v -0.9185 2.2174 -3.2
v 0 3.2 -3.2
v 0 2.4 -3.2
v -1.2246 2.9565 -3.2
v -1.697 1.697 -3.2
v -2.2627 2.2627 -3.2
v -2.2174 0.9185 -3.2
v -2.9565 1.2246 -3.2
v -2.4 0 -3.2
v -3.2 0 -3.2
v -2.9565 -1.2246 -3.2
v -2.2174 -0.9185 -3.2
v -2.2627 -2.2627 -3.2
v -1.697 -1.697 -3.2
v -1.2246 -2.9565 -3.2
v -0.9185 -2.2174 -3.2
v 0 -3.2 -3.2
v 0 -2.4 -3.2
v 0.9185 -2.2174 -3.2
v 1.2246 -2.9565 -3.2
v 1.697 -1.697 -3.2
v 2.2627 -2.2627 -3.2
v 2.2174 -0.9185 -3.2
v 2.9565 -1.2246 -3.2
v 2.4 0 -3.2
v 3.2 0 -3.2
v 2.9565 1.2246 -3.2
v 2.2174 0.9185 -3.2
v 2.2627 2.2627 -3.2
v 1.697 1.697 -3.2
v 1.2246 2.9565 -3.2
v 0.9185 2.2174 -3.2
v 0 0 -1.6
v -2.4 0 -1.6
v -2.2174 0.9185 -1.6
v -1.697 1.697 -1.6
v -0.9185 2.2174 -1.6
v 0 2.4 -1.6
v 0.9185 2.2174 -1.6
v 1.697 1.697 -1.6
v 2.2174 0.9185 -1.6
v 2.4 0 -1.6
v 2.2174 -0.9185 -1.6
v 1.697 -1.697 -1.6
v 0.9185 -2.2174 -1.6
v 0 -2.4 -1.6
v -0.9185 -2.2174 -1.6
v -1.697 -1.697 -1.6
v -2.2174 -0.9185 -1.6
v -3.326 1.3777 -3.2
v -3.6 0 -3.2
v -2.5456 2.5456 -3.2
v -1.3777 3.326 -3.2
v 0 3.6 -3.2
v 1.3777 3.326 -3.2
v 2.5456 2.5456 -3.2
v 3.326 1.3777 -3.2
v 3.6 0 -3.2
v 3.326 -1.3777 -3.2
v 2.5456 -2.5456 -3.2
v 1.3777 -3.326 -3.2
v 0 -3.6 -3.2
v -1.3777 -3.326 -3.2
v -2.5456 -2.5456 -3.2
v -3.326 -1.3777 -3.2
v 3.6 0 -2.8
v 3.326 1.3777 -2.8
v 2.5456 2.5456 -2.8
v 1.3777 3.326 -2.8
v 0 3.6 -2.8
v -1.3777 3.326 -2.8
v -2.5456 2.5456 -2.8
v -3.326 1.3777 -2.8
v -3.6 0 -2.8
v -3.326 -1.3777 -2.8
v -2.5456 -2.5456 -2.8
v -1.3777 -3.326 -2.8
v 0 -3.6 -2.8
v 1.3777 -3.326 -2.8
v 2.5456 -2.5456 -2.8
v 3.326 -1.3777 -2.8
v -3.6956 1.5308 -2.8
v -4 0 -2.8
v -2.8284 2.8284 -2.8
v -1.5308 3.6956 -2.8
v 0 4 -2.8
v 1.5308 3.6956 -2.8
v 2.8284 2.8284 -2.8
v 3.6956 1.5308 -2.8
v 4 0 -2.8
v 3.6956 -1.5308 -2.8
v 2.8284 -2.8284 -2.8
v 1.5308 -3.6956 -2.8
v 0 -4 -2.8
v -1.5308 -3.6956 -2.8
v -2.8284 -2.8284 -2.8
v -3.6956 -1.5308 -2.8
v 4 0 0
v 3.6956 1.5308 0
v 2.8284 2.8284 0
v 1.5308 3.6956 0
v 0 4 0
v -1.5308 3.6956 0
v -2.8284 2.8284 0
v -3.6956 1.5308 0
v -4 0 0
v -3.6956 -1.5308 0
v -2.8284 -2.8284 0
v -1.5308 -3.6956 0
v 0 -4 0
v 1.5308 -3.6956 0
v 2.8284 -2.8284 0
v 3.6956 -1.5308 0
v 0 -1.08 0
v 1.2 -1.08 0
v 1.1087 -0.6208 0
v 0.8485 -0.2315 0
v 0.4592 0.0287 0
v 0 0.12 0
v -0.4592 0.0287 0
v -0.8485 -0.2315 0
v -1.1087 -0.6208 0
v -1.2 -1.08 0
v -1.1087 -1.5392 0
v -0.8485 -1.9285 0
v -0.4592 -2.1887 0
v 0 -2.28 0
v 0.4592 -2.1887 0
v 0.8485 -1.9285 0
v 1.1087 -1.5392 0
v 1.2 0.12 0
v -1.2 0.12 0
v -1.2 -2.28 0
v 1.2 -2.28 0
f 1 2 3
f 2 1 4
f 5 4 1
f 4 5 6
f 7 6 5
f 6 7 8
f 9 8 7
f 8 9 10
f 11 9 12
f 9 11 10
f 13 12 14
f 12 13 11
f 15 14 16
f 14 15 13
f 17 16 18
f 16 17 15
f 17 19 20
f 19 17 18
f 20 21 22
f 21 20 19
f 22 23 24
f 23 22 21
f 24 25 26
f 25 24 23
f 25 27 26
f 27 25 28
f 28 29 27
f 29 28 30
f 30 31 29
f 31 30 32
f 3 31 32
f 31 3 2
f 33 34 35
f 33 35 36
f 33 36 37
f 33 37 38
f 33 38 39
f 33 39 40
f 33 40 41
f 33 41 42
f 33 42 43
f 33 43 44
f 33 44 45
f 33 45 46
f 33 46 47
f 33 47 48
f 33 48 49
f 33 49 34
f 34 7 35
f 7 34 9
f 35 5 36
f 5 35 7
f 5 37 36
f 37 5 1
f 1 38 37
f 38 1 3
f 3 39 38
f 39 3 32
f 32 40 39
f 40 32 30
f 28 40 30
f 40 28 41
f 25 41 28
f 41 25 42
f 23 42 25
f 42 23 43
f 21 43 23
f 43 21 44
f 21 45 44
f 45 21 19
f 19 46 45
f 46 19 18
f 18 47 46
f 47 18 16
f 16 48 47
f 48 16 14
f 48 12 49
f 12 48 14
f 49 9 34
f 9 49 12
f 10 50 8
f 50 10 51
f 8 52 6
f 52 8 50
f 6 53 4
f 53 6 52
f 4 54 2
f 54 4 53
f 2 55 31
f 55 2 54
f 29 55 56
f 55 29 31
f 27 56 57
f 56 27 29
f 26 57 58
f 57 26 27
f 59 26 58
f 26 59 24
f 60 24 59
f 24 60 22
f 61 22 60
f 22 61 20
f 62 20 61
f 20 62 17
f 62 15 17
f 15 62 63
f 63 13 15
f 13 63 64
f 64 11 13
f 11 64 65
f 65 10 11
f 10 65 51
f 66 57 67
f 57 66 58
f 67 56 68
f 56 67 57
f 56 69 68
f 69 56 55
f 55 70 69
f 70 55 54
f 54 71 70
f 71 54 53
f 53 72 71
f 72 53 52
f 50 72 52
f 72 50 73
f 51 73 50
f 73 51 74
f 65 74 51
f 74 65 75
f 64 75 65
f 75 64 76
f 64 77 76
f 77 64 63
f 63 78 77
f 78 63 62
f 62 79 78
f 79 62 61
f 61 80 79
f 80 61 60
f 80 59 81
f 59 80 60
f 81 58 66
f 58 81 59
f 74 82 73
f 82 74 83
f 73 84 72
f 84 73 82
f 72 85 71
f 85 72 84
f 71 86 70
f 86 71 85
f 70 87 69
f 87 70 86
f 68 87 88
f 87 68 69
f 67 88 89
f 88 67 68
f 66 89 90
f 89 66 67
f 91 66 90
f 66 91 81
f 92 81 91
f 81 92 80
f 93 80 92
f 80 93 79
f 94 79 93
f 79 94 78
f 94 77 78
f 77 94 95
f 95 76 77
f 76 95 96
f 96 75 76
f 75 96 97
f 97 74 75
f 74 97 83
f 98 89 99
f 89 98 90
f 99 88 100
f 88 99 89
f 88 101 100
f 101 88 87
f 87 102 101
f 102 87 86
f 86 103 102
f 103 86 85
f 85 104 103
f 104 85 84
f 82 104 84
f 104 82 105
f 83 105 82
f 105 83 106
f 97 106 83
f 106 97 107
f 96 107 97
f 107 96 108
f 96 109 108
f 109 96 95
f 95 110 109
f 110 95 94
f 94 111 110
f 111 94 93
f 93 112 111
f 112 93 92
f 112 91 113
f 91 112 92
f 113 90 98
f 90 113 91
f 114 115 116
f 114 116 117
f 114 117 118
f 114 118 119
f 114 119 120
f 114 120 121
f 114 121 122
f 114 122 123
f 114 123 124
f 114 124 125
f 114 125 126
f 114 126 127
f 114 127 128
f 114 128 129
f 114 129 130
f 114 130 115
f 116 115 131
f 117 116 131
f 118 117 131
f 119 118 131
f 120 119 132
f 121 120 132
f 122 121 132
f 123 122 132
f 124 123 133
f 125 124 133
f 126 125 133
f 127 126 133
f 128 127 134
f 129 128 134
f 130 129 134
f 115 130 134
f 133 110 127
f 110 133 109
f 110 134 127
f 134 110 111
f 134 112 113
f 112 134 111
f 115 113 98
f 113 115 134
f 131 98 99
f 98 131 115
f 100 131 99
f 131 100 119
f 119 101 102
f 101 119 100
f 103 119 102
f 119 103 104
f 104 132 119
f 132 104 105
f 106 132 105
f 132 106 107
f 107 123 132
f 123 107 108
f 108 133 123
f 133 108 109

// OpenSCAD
// file: ../p/4-4ring3.scad
use <../lib.scad>
function ldraw_lib__4_4ring3() = [
// 0 Ring  3 x 1.0
// 0 Name: 4-4ring3.dat
// 0 Author: James Jessiman
// 0 !LDRAW_ORG Primitive UPDATE 2009-01
// 0 !LICENSE Licensed under CC BY 2.0 and CC BY 4.0 : see CAreadme.txt
// 
// 0 BFC CERTIFY CCW
  [0,"BFC","CERTIFY"],
  [0,"BFC","CCW"],
// 
// 0 !HISTORY 1998-12-15 [PTadmin] Official Update 1998-10
// 0 !HISTORY 2002-04-05 [hafhead] Added BFC statement
// 0 !HISTORY 2002-04-25 [PTadmin] Official Update 2002-02
// 0 !HISTORY 2007-06-24 [PTadmin] Header formatted for Contributor Agreement
// 0 !HISTORY 2008-07-01 [PTadmin] Official Update 2008-01
// 0 !HISTORY 2008-08-26 [cwdee] Switch polygon winding and rename
// 0 !HISTORY 2009-05-02 [PTadmin] Official Update 2009-01
// 
// 
// 4 16 -1.5308 0 3.6956 -1.1481 0 2.7717 0 0 3 0 0 4
  [4,16,-1.5308,0,3.6956,-1.1481,0,2.7717,0,0,3,0,0,4],
// 4 16 -2.8284 0 2.8284 -2.1213 0 2.1213 -1.1481 0 2.7717 -1.5308 0 3.6956
  [4,16,-2.8284,0,2.8284,-2.1213,0,2.1213,-1.1481,0,2.7717,-1.5308,0,3.6956],
// 4 16 -3.6956 0 1.5308 -2.7717 0 1.1481 -2.1213 0 2.1213 -2.8284 0 2.8284
  [4,16,-3.6956,0,1.5308,-2.7717,0,1.1481,-2.1213,0,2.1213,-2.8284,0,2.8284],
// 4 16 -4 0 0 -3 0 0 -2.7717 0 1.1481 -3.6956 0 1.5308
  [4,16,-4,0,0,-3,0,0,-2.7717,0,1.1481,-3.6956,0,1.5308],
// 4 16 -3.6956 0 -1.5308 -2.7717 0 -1.1481 -3 0 0 -4 0 0
  [4,16,-3.6956,0,-1.5308,-2.7717,0,-1.1481,-3,0,0,-4,0,0],
// 4 16 -2.8284 0 -2.8284 -2.1213 0 -2.1213 -2.7717 0 -1.1481 -3.6956 0 -1.5308
  [4,16,-2.8284,0,-2.8284,-2.1213,0,-2.1213,-2.7717,0,-1.1481,-3.6956,0,-1.5308],
// 4 16 -1.5308 0 -3.6956 -1.1481 0 -2.7717 -2.1213 0 -2.1213 -2.8284 0 -2.8284
  [4,16,-1.5308,0,-3.6956,-1.1481,0,-2.7717,-2.1213,0,-2.1213,-2.8284,0,-2.8284],
// 4 16 0 0 -4 0 0 -3 -1.1481 0 -2.7717 -1.5308 0 -3.6956
  [4,16,0,0,-4,0,0,-3,-1.1481,0,-2.7717,-1.5308,0,-3.6956],
// 4 16 1.5308 0 -3.6956 1.1481 0 -2.7717 0 0 -3 0 0 -4
  [4,16,1.5308,0,-3.6956,1.1481,0,-2.7717,0,0,-3,0,0,-4],
// 4 16 2.8284 0 -2.8284 2.1213 0 -2.1213 1.1481 0 -2.7717 1.5308 0 -3.6956
  [4,16,2.8284,0,-2.8284,2.1213,0,-2.1213,1.1481,0,-2.7717,1.5308,0,-3.6956],
// 4 16 3.6956 0 -1.5308 2.7717 0 -1.1481 2.1213 0 -2.1213 2.8284 0 -2.8284
  [4,16,3.6956,0,-1.5308,2.7717,0,-1.1481,2.1213,0,-2.1213,2.8284,0,-2.8284],
// 4 16 4 0 0 3 0 0 2.7717 0 -1.1481 3.6956 0 -1.5308
  [4,16,4,0,0,3,0,0,2.7717,0,-1.1481,3.6956,0,-1.5308],
// 4 16 3.6956 0 1.5308 2.7717 0 1.1481 3 0 0 4 0 0
  [4,16,3.6956,0,1.5308,2.7717,0,1.1481,3,0,0,4,0,0],
// 4 16 2.8284 0 2.8284 2.1213 0 2.1213 2.7717 0 1.1481 3.6956 0 1.5308
  [4,16,2.8284,0,2.8284,2.1213,0,2.1213,2.7717,0,1.1481,3.6956,0,1.5308],
// 4 16 1.5308 0 3.6956 1.1481 0 2.7717 2.1213 0 2.1213 2.8284 0 2.8284
  [4,16,1.5308,0,3.6956,1.1481,0,2.7717,2.1213,0,2.1213,2.8284,0,2.8284],
// 4 16 0 0 4 0 0 3 1.1481 0 2.7717 1.5308 0 3.6956
  [4,16,0,0,4,0,0,3,1.1481,0,2.7717,1.5308,0,3.6956],
// 0
];
module ldraw_lib__4_4ring3(step=0, col=false, unit=2/5, alt=false, line=0.2, solid=!$preview)
    makepoly(ldraw_lib__4_4ring3(), step=step, col=col, unit=unit, alt=alt, line=line, solid=solid);
ldraw_lib__4_4ring3(line=0.2);
// file: ../p/4-4cylc.scad
use <../lib.scad>
use <4-4cyli.scad>
use <4-4disc.scad>
use <4-4edge.scad>
function ldraw_lib__4_4cylc() = [
// 0 Cylinder Closed 1.0
// 0 Name: 4-4cylc.dat
// 0 Author: Alex Taylor [anathema]
// 0 !LDRAW_ORG Primitive UPDATE 2009-02
// 0 !LICENSE Licensed under CC BY 2.0 and CC BY 4.0 : see CAreadme.txt
// 
// 0 BFC CERTIFY CCW
  [0,"BFC","CERTIFY"],
  [0,"BFC","CCW"],
// 
// 0 !HISTORY 2008-12-29 [cwdee] Removed one disc
// 0 !HISTORY 2009-09-03 [PTadmin] Official Update 2009-02
// 
// 
// 1 16 0 0 0 1 0 0 0 1 0 0 0 1 4-4edge.dat
  [1,16,0,0,0,1,0,0,0,1,0,0,0,1, ldraw_lib__4_4edge()],
// 1 16 0 1 0 1 0 0 0 1 0 0 0 1 4-4edge.dat
  [1,16,0,1,0,1,0,0,0,1,0,0,0,1, ldraw_lib__4_4edge()],
// 1 16 0 0 0 1 0 0 0 1 0 0 0 1 4-4disc.dat
  [1,16,0,0,0,1,0,0,0,1,0,0,0,1, ldraw_lib__4_4disc()],
// 1 16 0 0 0 1 0 0 0 1 0 0 0 1 4-4cyli.dat
  [1,16,0,0,0,1,0,0,0,1,0,0,0,1, ldraw_lib__4_4cyli()],
// 0
];
module ldraw_lib__4_4cylc(step=0, col=false, unit=2/5, alt=false, line=0.2, solid=!$preview)
    makepoly(ldraw_lib__4_4cylc(), step=step, col=col, unit=unit, alt=alt, line=line, solid=solid);
ldraw_lib__4_4cylc(line=0.2);
// file: ../p/4-4edge.scad
use <../lib.scad>
function ldraw_lib__4_4edge() = [
// 0 Circle 1.0
// 0 Name: 4-4edge.dat
// 0 Author: James Jessiman
// 0 !LDRAW_ORG Primitive UPDATE 2017-01
// 0 !LICENSE Licensed under CC BY 4.0 : see CAreadme.txt
// 
// 0 BFC CERTIFY CCW
  [0,"BFC","CERTIFY"],
  [0,"BFC","CCW"],
// 
// 0 !HISTORY 1998-12-15 [PTadmin] Official Update 1998-10
// 0 !HISTORY 2005-12-28 [PTadmin] Official Update 2005-01
// 0 !HISTORY 2007-06-24 [PTadmin] Header formatted for Contributor Agreement
// 0 !HISTORY 2008-07-01 [PTadmin] Official Update 2008-01
// 0 !HISTORY 2017-01-15 [Steffen] BFCed
// 0 !HISTORY 2017-12-30 [PTadmin] Official Update 2017-01
// 
// 
// 2 24 1 0 0 0.9239 0 0.3827
  [2,24,1,0,0,0.9239,0,0.3827],
// 2 24 0.9239 0 0.3827 0.7071 0 0.7071
  [2,24,0.9239,0,0.3827,0.7071,0,0.7071],
// 2 24 0.7071 0 0.7071 0.3827 0 0.9239
  [2,24,0.7071,0,0.7071,0.3827,0,0.9239],
// 2 24 0.3827 0 0.9239 0 0 1
  [2,24,0.3827,0,0.9239,0,0,1],
// 2 24 0 0 1 -0.3827 0 0.9239
  [2,24,0,0,1,-0.3827,0,0.9239],
// 2 24 -0.3827 0 0.9239 -0.7071 0 0.7071
  [2,24,-0.3827,0,0.9239,-0.7071,0,0.7071],
// 2 24 -0.7071 0 0.7071 -0.9239 0 0.3827
  [2,24,-0.7071,0,0.7071,-0.9239,0,0.3827],
// 2 24 -0.9239 0 0.3827 -1 0 -0
  [2,24,-0.9239,0,0.3827,-1,0,-0],
// 2 24 -1 0 -0 -0.9239 0 -0.3827
  [2,24,-1,0,-0,-0.9239,0,-0.3827],
// 2 24 -0.9239 0 -0.3827 -0.7071 0 -0.7071
  [2,24,-0.9239,0,-0.3827,-0.7071,0,-0.7071],
// 2 24 -0.7071 0 -0.7071 -0.3827 0 -0.9239
  [2,24,-0.7071,0,-0.7071,-0.3827,0,-0.9239],
// 2 24 -0.3827 0 -0.9239 0 0 -1
  [2,24,-0.3827,0,-0.9239,0,0,-1],
// 2 24 0 0 -1 0.3827 0 -0.9239
  [2,24,0,0,-1,0.3827,0,-0.9239],
// 2 24 0.3827 0 -0.9239 0.7071 0 -0.7071
  [2,24,0.3827,0,-0.9239,0.7071,0,-0.7071],
// 2 24 0.7071 0 -0.7071 0.9239 0 -0.3827
  [2,24,0.7071,0,-0.7071,0.9239,0,-0.3827],
// 2 24 0.9239 0 -0.3827 1 0 0
  [2,24,0.9239,0,-0.3827,1,0,0],
];
module ldraw_lib__4_4edge(step=0, col=false, unit=2/5, alt=false, line=0.2, solid=!$preview)
    makepoly(ldraw_lib__4_4edge(), step=step, col=col, unit=unit, alt=alt, line=line, solid=solid);
ldraw_lib__4_4edge(line=0.2);
// file: ../p/4-4cyli.scad
use <../lib.scad>
function ldraw_lib__4_4cyli() = [
// 0 Cylinder 1.0
// 0 Name: 4-4cyli.dat
// 0 Author: James Jessiman
// 0 !LDRAW_ORG Primitive UPDATE 2005-01
// 0 !LICENSE Licensed under CC BY 2.0 and CC BY 4.0 : see CAreadme.txt
// 
// 0 BFC CERTIFY CCW
  [0,"BFC","CERTIFY"],
  [0,"BFC","CCW"],
// 
// 0 !HISTORY 1998-12-15 [PTadmin] Official Update 1998-10
// 0 !HISTORY 2002-03-23 [sbliss] Added BFC statement; merged headers from files in distributions LDraw 0.27 and Complete.
// 0 !HISTORY 2002-04-25 [PTadmin] Official Update 2002-02
// 0 !HISTORY 2004-12-14 [guyvivan] BFC CCW
// 0 !HISTORY 2005-12-28 [PTadmin] Official Update 2005-01
// 0 !HISTORY 2007-06-24 [PTadmin] Header formatted for Contributor Agreement
// 0 !HISTORY 2008-07-01 [PTadmin] Official Update 2008-01
// 
// 
// 4 16 1 1 0 0.9239 1 0.3827 0.9239 0 0.3827 1 0 0
  [4,16,1,1,0,0.9239,1,0.3827,0.9239,0,0.3827,1,0,0],
// 5 24 1 0 0 1 1 0 0.9239 0 0.3827 0.9239 0 -0.3827
  [5,24,1,0,0,1,1,0,0.9239,0,0.3827,0.9239,0,-0.3827],
// 4 16 0.9239 1 0.3827 0.7071 1 0.7071 0.7071 0 0.7071 0.9239 0 0.3827
  [4,16,0.9239,1,0.3827,0.7071,1,0.7071,0.7071,0,0.7071,0.9239,0,0.3827],
// 5 24 0.9239 0 0.3827 0.9239 1 0.3827 0.7071 0 0.7071 1 0 0
  [5,24,0.9239,0,0.3827,0.9239,1,0.3827,0.7071,0,0.7071,1,0,0],
// 4 16 0.7071 1 0.7071 0.3827 1 0.9239 0.3827 0 0.9239 0.7071 0 0.7071
  [4,16,0.7071,1,0.7071,0.3827,1,0.9239,0.3827,0,0.9239,0.7071,0,0.7071],
// 5 24 0.7071 0 0.7071 0.7071 1 0.7071 0.3827 0 0.9239 0.9239 0 0.3827
  [5,24,0.7071,0,0.7071,0.7071,1,0.7071,0.3827,0,0.9239,0.9239,0,0.3827],
// 4 16 0.3827 1 0.9239 0 1 1 0 0 1 0.3827 0 0.9239
  [4,16,0.3827,1,0.9239,0,1,1,0,0,1,0.3827,0,0.9239],
// 5 24 0.3827 0 0.9239 0.3827 1 0.9239 0 0 1 0.7071 0 0.7071
  [5,24,0.3827,0,0.9239,0.3827,1,0.9239,0,0,1,0.7071,0,0.7071],
// 4 16 0 1 1 -0.3827 1 0.9239 -0.3827 0 0.9239 0 0 1
  [4,16,0,1,1,-0.3827,1,0.9239,-0.3827,0,0.9239,0,0,1],
// 5 24 0 0 1 0 1 1 -0.3827 0 0.9239 0.3827 0 0.9239
  [5,24,0,0,1,0,1,1,-0.3827,0,0.9239,0.3827,0,0.9239],
// 4 16 -0.3827 1 0.9239 -0.7071 1 0.7071 -0.7071 0 0.7071 -0.3827 0 0.9239
  [4,16,-0.3827,1,0.9239,-0.7071,1,0.7071,-0.7071,0,0.7071,-0.3827,0,0.9239],
// 5 24 -0.3827 0 0.9239 -0.3827 1 0.9239 -0.7071 0 0.7071 0 0 1
  [5,24,-0.3827,0,0.9239,-0.3827,1,0.9239,-0.7071,0,0.7071,0,0,1],
// 4 16 -0.7071 1 0.7071 -0.9239 1 0.3827 -0.9239 0 0.3827 -0.7071 0 0.7071
  [4,16,-0.7071,1,0.7071,-0.9239,1,0.3827,-0.9239,0,0.3827,-0.7071,0,0.7071],
// 5 24 -0.7071 0 0.7071 -0.7071 1 0.7071 -0.9239 0 0.3827 -0.3827 0 0.9239
  [5,24,-0.7071,0,0.7071,-0.7071,1,0.7071,-0.9239,0,0.3827,-0.3827,0,0.9239],
// 4 16 -0.9239 1 0.3827 -1 1 0 -1 0 0 -0.9239 0 0.3827
  [4,16,-0.9239,1,0.3827,-1,1,0,-1,0,0,-0.9239,0,0.3827],
// 5 24 -0.9239 0 0.3827 -0.9239 1 0.3827 -1 0 0 -0.7071 0 0.7071
  [5,24,-0.9239,0,0.3827,-0.9239,1,0.3827,-1,0,0,-0.7071,0,0.7071],
// 4 16 -1 1 0 -0.9239 1 -0.3827 -0.9239 0 -0.3827 -1 0 0
  [4,16,-1,1,0,-0.9239,1,-0.3827,-0.9239,0,-0.3827,-1,0,0],
// 5 24 -1 0 0 -1 1 0 -0.9239 0 -0.3827 -0.9239 0 0.3827
  [5,24,-1,0,0,-1,1,0,-0.9239,0,-0.3827,-0.9239,0,0.3827],
// 4 16 -0.9239 1 -0.3827 -0.7071 1 -0.7071 -0.7071 0 -0.7071 -0.9239 0 -0.3827
  [4,16,-0.9239,1,-0.3827,-0.7071,1,-0.7071,-0.7071,0,-0.7071,-0.9239,0,-0.3827],
// 5 24 -0.9239 0 -0.3827 -0.9239 1 -0.3827 -0.7071 0 -0.7071 -1 0 0
  [5,24,-0.9239,0,-0.3827,-0.9239,1,-0.3827,-0.7071,0,-0.7071,-1,0,0],
// 4 16 -0.7071 1 -0.7071 -0.3827 1 -0.9239 -0.3827 0 -0.9239 -0.7071 0 -0.7071
  [4,16,-0.7071,1,-0.7071,-0.3827,1,-0.9239,-0.3827,0,-0.9239,-0.7071,0,-0.7071],
// 5 24 -0.7071 0 -0.7071 -0.7071 1 -0.7071 -0.3827 0 -0.9239 -0.9239 0 -0.3827
  [5,24,-0.7071,0,-0.7071,-0.7071,1,-0.7071,-0.3827,0,-0.9239,-0.9239,0,-0.3827],
// 4 16 -0.3827 1 -0.9239 0 1 -1 0 0 -1 -0.3827 0 -0.9239
  [4,16,-0.3827,1,-0.9239,0,1,-1,0,0,-1,-0.3827,0,-0.9239],
// 5 24 -0.3827 0 -0.9239 -0.3827 1 -0.9239 0 0 -1 -0.7071 0 -0.7071
  [5,24,-0.3827,0,-0.9239,-0.3827,1,-0.9239,0,0,-1,-0.7071,0,-0.7071],
// 4 16 0 1 -1 0.3827 1 -0.9239 0.3827 0 -0.9239 0 0 -1
  [4,16,0,1,-1,0.3827,1,-0.9239,0.3827,0,-0.9239,0,0,-1],
// 5 24 0 0 -1 0 1 -1 0.3827 0 -0.9239 -0.3827 0 -0.9239
  [5,24,0,0,-1,0,1,-1,0.3827,0,-0.9239,-0.3827,0,-0.9239],
// 4 16 0.3827 1 -0.9239 0.7071 1 -0.7071 0.7071 0 -0.7071 0.3827 0 -0.9239
  [4,16,0.3827,1,-0.9239,0.7071,1,-0.7071,0.7071,0,-0.7071,0.3827,0,-0.9239],
// 5 24 0.3827 0 -0.9239 0.3827 1 -0.9239 0.7071 0 -0.7071 0 0 -1
  [5,24,0.3827,0,-0.9239,0.3827,1,-0.9239,0.7071,0,-0.7071,0,0,-1],
// 4 16 0.7071 1 -0.7071 0.9239 1 -0.3827 0.9239 0 -0.3827 0.7071 0 -0.7071
  [4,16,0.7071,1,-0.7071,0.9239,1,-0.3827,0.9239,0,-0.3827,0.7071,0,-0.7071],
// 5 24 0.7071 0 -0.7071 0.7071 1 -0.7071 0.9239 0 -0.3827 0.3827 0 -0.9239
  [5,24,0.7071,0,-0.7071,0.7071,1,-0.7071,0.9239,0,-0.3827,0.3827,0,-0.9239],
// 4 16 0.9239 1 -0.3827 1 1 0 1 0 0 0.9239 0 -0.3827
  [4,16,0.9239,1,-0.3827,1,1,0,1,0,0,0.9239,0,-0.3827],
// 5 24 0.9239 0 -0.3827 0.9239 1 -0.3827 1 0 0 0.7071 0 -0.7071
  [5,24,0.9239,0,-0.3827,0.9239,1,-0.3827,1,0,0,0.7071,0,-0.7071],
// 0
];
module ldraw_lib__4_4cyli(step=0, col=false, unit=2/5, alt=false, line=0.2, solid=!$preview)
    makepoly(ldraw_lib__4_4cyli(), step=step, col=col, unit=unit, alt=alt, line=line, solid=solid);
ldraw_lib__4_4cyli(line=0.2);
// file: ../p/empty.scad
use <../lib.scad>
function ldraw_lib__empty() = [
// 0 Empty
// 0 Name: empty.dat
// 0 Author: Steffen [Steffen]
// 0 !LDRAW_ORG Primitive UPDATE 2015-01
// 0 !LICENSE Licensed under CC BY 4.0 : see CAreadme.txt
// 
// 0 BFC CERTIFY CCW
  [0,"BFC","CERTIFY"],
  [0,"BFC","CCW"],
// 
// 0 !HISTORY 2015-10-11 [PTadmin] Official Update 2015-01
// 
// 
// 0 // Tool MLCad cannot handle really empty files. This file is used as a workaround.
// 0 // It exceptionally contains forbidden non-LDRAW standard syntax to satisfy MLCad until it is fixed OR a different editor has become the de-facto LDRAW standard.
// 0 // The line being used here is an "impossible" conditional line which never should be visible,
// 0 // additionally hidden by a syntax explicitly hiding it from displaying.
// 
// 0 MLCAD HIDE 5 24 0 0 0 0.0001 0 0 0.0001 -0.0001 0 0 0 0
];
module ldraw_lib__empty(step=0, col=false, unit=2/5, alt=false, line=0.2, solid=!$preview)
    makepoly(ldraw_lib__empty(), step=step, col=col, unit=unit, alt=alt, line=line, solid=solid);
ldraw_lib__empty(line=0.2);
// file: ../p/stud4o.scad
use <../lib.scad>
use <4-4cylc.scad>
use <4-4ring3.scad>
function ldraw_lib__stud4o() = [
// 0 Stud Tube Open without Outer Cylinder
// 0 Name: stud4o.dat
// 0 Author: Magnus Forsberg [MagFors]
// 0 !LDRAW_ORG Primitive UPDATE 2011-02
// 0 !LICENSE Licensed under CC BY 4.0 : see CAreadme.txt
// 
// 0 !HELP This stud is a "antistud" to be used like a underside stud,
// 0 !HELP but without the outer cylinder.
// 0 !HELP 1 47 0 0 0 1 0 0 0 1 0 0 0 1 stud4.dat
// 
// 0 BFC CERTIFY CCW
  [0,"BFC","CERTIFY"],
  [0,"BFC","CCW"],
// 
// 0 !HISTORY 2011-12-29 [PTadmin] Official Update 2011-02
// 
// 
// 1 16 0 -4 0 2 0 0 0 1 0 0 0 2 4-4ring3.dat
  [1,16,0,-4,0,2,0,0,0,1,0,0,0,2, ldraw_lib__4_4ring3()],
// 0 BFC INVERTNEXT
  [0,"BFC","INVERTNEXT"],
// 1 16 0 0 0 -6 0 0 0 -4 0 0 0 6 4-4cylc.dat
  [1,16,0,0,0,-6,0,0,0,-4,0,0,0,6, ldraw_lib__4_4cylc()],
];
module ldraw_lib__stud4o(step=0, col=false, unit=2/5, alt=false, line=0.2, solid=!$preview)
    makepoly(ldraw_lib__stud4o(), step=step, col=col, unit=unit, alt=alt, line=line, solid=solid);
ldraw_lib__stud4o(line=0.2);
// file: ../p/4-4ring9.scad
use <../lib.scad>
function ldraw_lib__4_4ring9() = [
// 0 Ring  9 x 1.0
// 0 Name: 4-4ring9.dat
// 0 Author: John Riley [jriley]
// 0 !LDRAW_ORG Primitive UPDATE 2004-02
// 0 !LICENSE Licensed under CC BY 2.0 and CC BY 4.0 : see CAreadme.txt
// 
// 0 BFC CERTIFY CCW
  [0,"BFC","CERTIFY"],
  [0,"BFC","CCW"],
// 
// 0 !HISTORY 2004-04-22 [PTadmin] Official Update 2004-02
// 0 !HISTORY 2007-06-24 [PTadmin] Header formatted for Contributor Agreement
// 0 !HISTORY 2008-07-01 [PTadmin] Official Update 2008-01
// 
// 
// 4 16 9 0 0 10 0 0 9.239 0 3.827 8.3151 0 3.4443
  [4,16,9,0,0,10,0,0,9.239,0,3.827,8.3151,0,3.4443],
// 4 16 8.3151 0 3.4443 9.239 0 3.827 7.071 0 7.071 6.3639 0 6.3639
  [4,16,8.3151,0,3.4443,9.239,0,3.827,7.071,0,7.071,6.3639,0,6.3639],
// 4 16 6.3639 0 6.3639 7.071 0 7.071 3.827 0 9.239 3.4443 0 8.3151
  [4,16,6.3639,0,6.3639,7.071,0,7.071,3.827,0,9.239,3.4443,0,8.3151],
// 4 16 3.4443 0 8.3151 3.827 0 9.239 0 0 10 0 0 9
  [4,16,3.4443,0,8.3151,3.827,0,9.239,0,0,10,0,0,9],
// 4 16 0 0 9 0 0 10 -3.827 0 9.239 -3.4443 0 8.3151
  [4,16,0,0,9,0,0,10,-3.827,0,9.239,-3.4443,0,8.3151],
// 4 16 -3.4443 0 8.3151 -3.827 0 9.239 -7.071 0 7.071 -6.3639 0 6.3639
  [4,16,-3.4443,0,8.3151,-3.827,0,9.239,-7.071,0,7.071,-6.3639,0,6.3639],
// 4 16 -6.3639 0 6.3639 -7.071 0 7.071 -9.239 0 3.827 -8.3151 0 3.4443
  [4,16,-6.3639,0,6.3639,-7.071,0,7.071,-9.239,0,3.827,-8.3151,0,3.4443],
// 4 16 -8.3151 0 3.4443 -9.239 0 3.827 -10 0 0 -9 0 0
  [4,16,-8.3151,0,3.4443,-9.239,0,3.827,-10,0,0,-9,0,0],
// 4 16 -9 0 0 -10 0 0 -9.239 0 -3.827 -8.3151 0 -3.4443
  [4,16,-9,0,0,-10,0,0,-9.239,0,-3.827,-8.3151,0,-3.4443],
// 4 16 -8.3151 0 -3.4443 -9.239 0 -3.827 -7.071 0 -7.071 -6.3639 0 -6.3639
  [4,16,-8.3151,0,-3.4443,-9.239,0,-3.827,-7.071,0,-7.071,-6.3639,0,-6.3639],
// 4 16 -6.3639 0 -6.3639 -7.071 0 -7.071 -3.827 0 -9.239 -3.4443 0 -8.3151
  [4,16,-6.3639,0,-6.3639,-7.071,0,-7.071,-3.827,0,-9.239,-3.4443,0,-8.3151],
// 4 16 -3.4443 0 -8.3151 -3.827 0 -9.239 0 0 -10 0 0 -9
  [4,16,-3.4443,0,-8.3151,-3.827,0,-9.239,0,0,-10,0,0,-9],
// 4 16 0 0 -9 0 0 -10 3.827 0 -9.239 3.4443 0 -8.3151
  [4,16,0,0,-9,0,0,-10,3.827,0,-9.239,3.4443,0,-8.3151],
// 4 16 3.4443 0 -8.3151 3.827 0 -9.239 7.071 0 -7.071 6.3639 0 -6.3639
  [4,16,3.4443,0,-8.3151,3.827,0,-9.239,7.071,0,-7.071,6.3639,0,-6.3639],
// 4 16 6.3639 0 -6.3639 7.071 0 -7.071 9.239 0 -3.827 8.3151 0 -3.4443
  [4,16,6.3639,0,-6.3639,7.071,0,-7.071,9.239,0,-3.827,8.3151,0,-3.4443],
// 4 16 8.3151 0 -3.4443 9.239 0 -3.827 10 0 0 9 0 0
  [4,16,8.3151,0,-3.4443,9.239,0,-3.827,10,0,0,9,0,0],
// 0
];
module ldraw_lib__4_4ring9(step=0, col=false, unit=2/5, alt=false, line=0.2, solid=!$preview)
    makepoly(ldraw_lib__4_4ring9(), step=step, col=col, unit=unit, alt=alt, line=line, solid=solid);
ldraw_lib__4_4ring9(line=0.2);
// file: ../p/4-4ring8.scad
use <../lib.scad>
function ldraw_lib__4_4ring8() = [
// 0 Ring  8 x 1.0
// 0 Name: 4-4ring8.dat
// 0 Author: Steffen [Steffen]
// 0 !LDRAW_ORG Primitive UPDATE 2012-01
// 0 !LICENSE Licensed under CC BY 4.0 : see CAreadme.txt
// 
// 0 BFC CERTIFY CCW
  [0,"BFC","CERTIFY"],
  [0,"BFC","CCW"],
// 
// 0 !HISTORY 2003-12-19 [PTadmin] Official Update 2003-03
// 0 !HISTORY 2007-06-24 [PTadmin] Header formatted for Contributor Agreement
// 0 !HISTORY 2008-07-01 [PTadmin] Official Update 2008-01
// 0 !HISTORY 2012-02-16 [Philo] Changed to CCW
// 0 !HISTORY 2012-03-30 [PTadmin] Official Update 2012-01
// 
// 
// 4 16 9 0 0 8.3151 0 3.4443 7.3912 0 3.0616 8 0 0
  [4,16,9,0,0,8.3151,0,3.4443,7.3912,0,3.0616,8,0,0],
// 4 16 8.3151 0 3.4443 6.3639 0 6.3639 5.6568 0 5.6568 7.3912 0 3.0616
  [4,16,8.3151,0,3.4443,6.3639,0,6.3639,5.6568,0,5.6568,7.3912,0,3.0616],
// 4 16 6.3639 0 6.3639 3.4443 0 8.3151 3.0616 0 7.3912 5.6568 0 5.6568
  [4,16,6.3639,0,6.3639,3.4443,0,8.3151,3.0616,0,7.3912,5.6568,0,5.6568],
// 4 16 3.4443 0 8.3151 0 0 9 0 0 8 3.0616 0 7.3912
  [4,16,3.4443,0,8.3151,0,0,9,0,0,8,3.0616,0,7.3912],
// 4 16 0 0 9 -3.4443 0 8.3151 -3.0616 0 7.3912 0 0 8
  [4,16,0,0,9,-3.4443,0,8.3151,-3.0616,0,7.3912,0,0,8],
// 4 16 -3.4443 0 8.3151 -6.3639 0 6.3639 -5.6568 0 5.6568 -3.0616 0 7.3912
  [4,16,-3.4443,0,8.3151,-6.3639,0,6.3639,-5.6568,0,5.6568,-3.0616,0,7.3912],
// 4 16 -6.3639 0 6.3639 -8.3151 0 3.4443 -7.3912 0 3.0616 -5.6568 0 5.6568
  [4,16,-6.3639,0,6.3639,-8.3151,0,3.4443,-7.3912,0,3.0616,-5.6568,0,5.6568],
// 4 16 -8.3151 0 3.4443 -9 0 0 -8 0 0 -7.3912 0 3.0616
  [4,16,-8.3151,0,3.4443,-9,0,0,-8,0,0,-7.3912,0,3.0616],
// 4 16 -9 0 0 -8.3151 0 -3.4443 -7.3912 0 -3.0616 -8 0 0
  [4,16,-9,0,0,-8.3151,0,-3.4443,-7.3912,0,-3.0616,-8,0,0],
// 4 16 -8.3151 0 -3.4443 -6.3639 0 -6.3639 -5.6568 0 -5.6568 -7.3912 0 -3.0616
  [4,16,-8.3151,0,-3.4443,-6.3639,0,-6.3639,-5.6568,0,-5.6568,-7.3912,0,-3.0616],
// 4 16 -6.3639 0 -6.3639 -3.4443 0 -8.3151 -3.0616 0 -7.3912 -5.6568 0 -5.6568
  [4,16,-6.3639,0,-6.3639,-3.4443,0,-8.3151,-3.0616,0,-7.3912,-5.6568,0,-5.6568],
// 4 16 -3.4443 0 -8.3151 0 0 -9 0 0 -8 -3.0616 0 -7.3912
  [4,16,-3.4443,0,-8.3151,0,0,-9,0,0,-8,-3.0616,0,-7.3912],
// 4 16 0 0 -9 3.4443 0 -8.3151 3.0616 0 -7.3912 0 0 -8
  [4,16,0,0,-9,3.4443,0,-8.3151,3.0616,0,-7.3912,0,0,-8],
// 4 16 3.4443 0 -8.3151 6.3639 0 -6.3639 5.6568 0 -5.6568 3.0616 0 -7.3912
  [4,16,3.4443,0,-8.3151,6.3639,0,-6.3639,5.6568,0,-5.6568,3.0616,0,-7.3912],
// 4 16 6.3639 0 -6.3639 8.3151 0 -3.4443 7.3912 0 -3.0616 5.6568 0 -5.6568
  [4,16,6.3639,0,-6.3639,8.3151,0,-3.4443,7.3912,0,-3.0616,5.6568,0,-5.6568],
// 4 16 8.3151 0 -3.4443 9 0 0 8 0 0 7.3912 0 -3.0616
  [4,16,8.3151,0,-3.4443,9,0,0,8,0,0,7.3912,0,-3.0616],
];
module ldraw_lib__4_4ring8(step=0, col=false, unit=2/5, alt=false, line=0.2, solid=!$preview)
    makepoly(ldraw_lib__4_4ring8(), step=step, col=col, unit=unit, alt=alt, line=line, solid=solid);
ldraw_lib__4_4ring8(line=0.2);
// file: ../p/4-4cylo.scad
use <../lib.scad>
use <4-4cyli.scad>
use <4-4edge.scad>
function ldraw_lib__4_4cylo() = [
// 0 Cylinder Open 1.0
// 0 Name: 4-4cylo.dat
// 0 Author: Mark Kennedy [mkennedy]
// 0 !LDRAW_ORG Primitive UPDATE 2010-01
// 0 !LICENSE Licensed under CC BY 4.0 : see CAreadme.txt
// 
// 0 BFC CERTIFY CCW
  [0,"BFC","CERTIFY"],
  [0,"BFC","CCW"],
// 
// 0 !HISTORY 2010-04-05 [PTadmin] Official Update 2010-01
// 
// 
// 1 16 0 0 0 1 0 0 0 1 0 0 0 1 4-4edge.dat
  [1,16,0,0,0,1,0,0,0,1,0,0,0,1, ldraw_lib__4_4edge()],
// 1 16 0 1 0 1 0 0 0 1 0 0 0 1 4-4edge.dat
  [1,16,0,1,0,1,0,0,0,1,0,0,0,1, ldraw_lib__4_4edge()],
// 1 16 0 0 0 1 0 0 0 1 0 0 0 1 4-4cyli.dat
  [1,16,0,0,0,1,0,0,0,1,0,0,0,1, ldraw_lib__4_4cyli()],
// 0
];
module ldraw_lib__4_4cylo(step=0, col=false, unit=2/5, alt=false, line=0.2, solid=!$preview)
    makepoly(ldraw_lib__4_4cylo(), step=step, col=col, unit=unit, alt=alt, line=line, solid=solid);
ldraw_lib__4_4cylo(line=0.2);
// file: ../p/1-16chrd.scad
use <../lib.scad>
use <empty.scad>
function ldraw_lib__1_16chrd() = [
// 0 Chord 0.0625
// 0 Name: 1-16chrd.dat
// 0 Author: Philippe Hurbain [Philo]
// 0 !LDRAW_ORG Primitive UPDATE 2015-01
// 0 !LICENSE Licensed under CC BY 4.0 : see CAreadme.txt
// 
// 0 BFC CERTIFY CCW
  [0,"BFC","CERTIFY"],
  [0,"BFC","CCW"],
// 
// 0 !HISTORY 2015-10-11 [PTadmin] Official Update 2015-01
// 
// 
// 0 // This file is intentionally empty because at the current \P resolution,
// 0 // an 1-16chrd is actually empty. However, this file still is present
// 0 // to allow tools to do primitives substition and fill in a real chrd here,
// 0 // or, if desired, to substitute this with the hi-res 48\1-16chrd.
// 
// 0 // This file is based on an idea by Darats at http://forums.ldraw.org/read.php?19,14500,14500#msg-14500
// 
// 1 16 0 0 0 1 0 0 0 1 0 0 0 1 empty.dat
  [1,16,0,0,0,1,0,0,0,1,0,0,0,1, ldraw_lib__empty()],
];
module ldraw_lib__1_16chrd(step=0, col=false, unit=2/5, alt=false, line=0.2, solid=!$preview)
    makepoly(ldraw_lib__1_16chrd(), step=step, col=col, unit=unit, alt=alt, line=line, solid=solid);
ldraw_lib__1_16chrd(line=0.2);
// file: s/98138s02.scad
use <../../lib.scad>
use <../../p/4-4cylo.scad>
use <../../p/4-4ring8.scad>
use <../../p/4-4ring9.scad>
use <../../p/stud4o.scad>
function ldraw_lib__s__98138s02() = [
// 0 ~Tile  1 x  1 Round with Groove without Complete Top Face
// 0 Name: s\98138s02.dat
// 0 Author: Magnus Forsberg [MagFors]
// 0 !LDRAW_ORG Subpart UPDATE 2020-01
// 0 !LICENSE Licensed under CC BY 4.0 : see CAreadme.txt
// 
// 0 BFC CERTIFY CCW
  [0,"BFC","CERTIFY"],
  [0,"BFC","CCW"],
// 
// 0 !HISTORY 2020-06-28 [PTadmin] Official Update 2020-01
// 
// 
// 1 16 0 4 0 1 0 0 0 -1 0 0 0 1 stud4o.dat
  [1,16,0,4,0,1,0,0,0,-1,0,0,0,1, ldraw_lib__stud4o()],
// 1 16 0 8 0 -1 0 0 0 -1 0 0 0 1 4-4ring8.dat
  [1,16,0,8,0,-1,0,0,0,-1,0,0,0,1, ldraw_lib__4_4ring8()],
// 1 16 0 7 0 9 0 0 0 1 0 0 0 9 4-4cylo.dat
  [1,16,0,7,0,9,0,0,0,1,0,0,0,9, ldraw_lib__4_4cylo()],
// 1 16 0 7 0 -1 0 0 0 -1 0 0 0 1 4-4ring9.dat
  [1,16,0,7,0,-1,0,0,0,-1,0,0,0,1, ldraw_lib__4_4ring9()],
// 1 16 0 0 0 10 0 0 0 7 0 0 0 10 4-4cylo.dat
  [1,16,0,0,0,10,0,0,0,7,0,0,0,10, ldraw_lib__4_4cylo()],
];
module ldraw_lib__s__98138s02(step=0, col=false, unit=2/5, alt=false, line=0.2, solid=!$preview)
    makepoly(ldraw_lib__s__98138s02(), step=step, col=col, unit=unit, alt=alt, line=line, solid=solid);
ldraw_lib__s__98138s02(line=0.2);
// file: ../p/4-4ndis.scad
use <../lib.scad>
function ldraw_lib__4_4ndis() = [
// 0 Disc Negative 1.0
// 0 Name: 4-4ndis.dat
// 0 Author: James Jessiman
// 0 !LDRAW_ORG Primitive UPDATE 2012-01
// 0 !LICENSE Licensed under CC BY 4.0 : see CAreadme.txt
// 
// 0 BFC CERTIFY CCW
  [0,"BFC","CERTIFY"],
  [0,"BFC","CCW"],
// 
// 0 !HISTORY 2002-03-23 [sbliss] Added BFC statement; compacted code
// 0 !HISTORY 2002-04-25 [PTadmin] Official Update 2002-02
// 0 !HISTORY 2007-06-24 [PTadmin] Header formatted for Contributor Agreement
// 0 !HISTORY 2008-07-01 [PTadmin] Official Update 2008-01
// 0 !HISTORY 2012-02-16 [Philo] Changed to CCW
// 0 !HISTORY 2012-03-30 [PTadmin] Official Update 2012-01
// 
// 
// 3 16 0.9239 0 0.3827 1 0 0 1 0 1
  [3,16,0.9239,0,0.3827,1,0,0,1,0,1],
// 3 16 0.7071 0 0.7071 0.9239 0 0.3827 1 0 1
  [3,16,0.7071,0,0.7071,0.9239,0,0.3827,1,0,1],
// 3 16 0.3827 0 0.9239 0.7071 0 0.7071 1 0 1
  [3,16,0.3827,0,0.9239,0.7071,0,0.7071,1,0,1],
// 3 16 0 0 1 0.3827 0 0.9239 1 0 1
  [3,16,0,0,1,0.3827,0,0.9239,1,0,1],
// 3 16 -0.3827 0 0.9239 0 0 1 -1 0 1
  [3,16,-0.3827,0,0.9239,0,0,1,-1,0,1],
// 3 16 -0.7071 0 0.7071 -0.3827 0 0.9239 -1 0 1
  [3,16,-0.7071,0,0.7071,-0.3827,0,0.9239,-1,0,1],
// 3 16 -0.9239 0 0.3827 -0.7071 0 0.7071 -1 0 1
  [3,16,-0.9239,0,0.3827,-0.7071,0,0.7071,-1,0,1],
// 3 16 -1 0 0 -0.9239 0 0.3827 -1 0 1
  [3,16,-1,0,0,-0.9239,0,0.3827,-1,0,1],
// 3 16 -0.9239 0 -0.3827 -1 0 0 -1 0 -1
  [3,16,-0.9239,0,-0.3827,-1,0,0,-1,0,-1],
// 3 16 -0.7071 0 -0.7071 -0.9239 0 -0.3827 -1 0 -1
  [3,16,-0.7071,0,-0.7071,-0.9239,0,-0.3827,-1,0,-1],
// 3 16 -0.3827 0 -0.9239 -0.7071 0 -0.7071 -1 0 -1
  [3,16,-0.3827,0,-0.9239,-0.7071,0,-0.7071,-1,0,-1],
// 3 16 0 0 -1 -0.3827 0 -0.9239 -1 0 -1
  [3,16,0,0,-1,-0.3827,0,-0.9239,-1,0,-1],
// 3 16 0.3827 0 -0.9239 0 0 -1 1 0 -1
  [3,16,0.3827,0,-0.9239,0,0,-1,1,0,-1],
// 3 16 0.7071 0 -0.7071 0.3827 0 -0.9239 1 0 -1
  [3,16,0.7071,0,-0.7071,0.3827,0,-0.9239,1,0,-1],
// 3 16 0.9239 0 -0.3827 0.7071 0 -0.7071 1 0 -1
  [3,16,0.9239,0,-0.3827,0.7071,0,-0.7071,1,0,-1],
// 3 16 1 0 0 0.9239 0 -0.3827 1 0 -1
  [3,16,1,0,0,0.9239,0,-0.3827,1,0,-1],
];
module ldraw_lib__4_4ndis(step=0, col=false, unit=2/5, alt=false, line=0.2, solid=!$preview)
    makepoly(ldraw_lib__4_4ndis(), step=step, col=col, unit=unit, alt=alt, line=line, solid=solid);
ldraw_lib__4_4ndis(line=0.2);
// file: ../p/4-4ering.scad
use <../lib.scad>
use <1-16chrd.scad>
function ldraw_lib__4_4ering() = [
// 0 Adapter Ring Triangles to Normal 1.0
// 0 Name: 4-4ering.dat
// 0 Author: Philippe Hurbain [Philo]
// 0 !LDRAW_ORG Primitive UPDATE 2015-01
// 0 !LICENSE Licensed under CC BY 4.0 : see CAreadme.txt
// 
// 0 BFC CERTIFY CCW
  [0,"BFC","CERTIFY"],
  [0,"BFC","CCW"],
// 
// 0 !HISTORY 2015-10-11 [PTadmin] Official Update 2015-01
// 
// 
// 0 // This file uses 1-16chrd (actually empty). It allows
// 0 // tools to do primitives substition and fill in a ring of chrd here,
// 0 // or, if desired, to substitute this with the hi-res 48\1-16chrd.
// 0 // This file is based on an idea by Darats at http://forums.ldraw.org/read.php?19,14500,14500#msg-14500
// 
// 1 16 0 0 0 1 0 0 0 1 0 0 0 1 1-16chrd.dat
  [1,16,0,0,0,1,0,0,0,1,0,0,0,1, ldraw_lib__1_16chrd()],
// 1 16 0 0 0 0.92388 0 0.38268 0 1 0 -0.38268 0 0.92388 1-16chrd.dat
  [1,16,0,0,0,0.92388,0,0.38268,0,1,0,-0.38268,0,0.92388, ldraw_lib__1_16chrd()],
// 1 16 0 0 0 0.70711 0 0.70711 0 1 0 -0.70711 0 0.70711 1-16chrd.dat
  [1,16,0,0,0,0.70711,0,0.70711,0,1,0,-0.70711,0,0.70711, ldraw_lib__1_16chrd()],
// 1 16 0 0 0 0.38268 0 0.92388 0 1 0 -0.92388 0 0.38268 1-16chrd.dat
  [1,16,0,0,0,0.38268,0,0.92388,0,1,0,-0.92388,0,0.38268, ldraw_lib__1_16chrd()],
// 1 16 0 0 0 0 0 1 0 1 0 -1 0 0 1-16chrd.dat
  [1,16,0,0,0,0,0,1,0,1,0,-1,0,0, ldraw_lib__1_16chrd()],
// 1 16 0 0 0 -0.38268 0 0.92388 0 1 0 -0.92388 0 -0.38268 1-16chrd.dat
  [1,16,0,0,0,-0.38268,0,0.92388,0,1,0,-0.92388,0,-0.38268, ldraw_lib__1_16chrd()],
// 1 16 0 0 0 -0.70711 0 0.70711 0 1 0 -0.70711 0 -0.70711 1-16chrd.dat
  [1,16,0,0,0,-0.70711,0,0.70711,0,1,0,-0.70711,0,-0.70711, ldraw_lib__1_16chrd()],
// 1 16 0 0 0 -0.92388 0 0.38268 0 1 0 -0.38268 0 -0.92388 1-16chrd.dat
  [1,16,0,0,0,-0.92388,0,0.38268,0,1,0,-0.38268,0,-0.92388, ldraw_lib__1_16chrd()],
// 1 16 0 0 0 0 0 -1 0 1 0 1 0 0 1-16chrd.dat
  [1,16,0,0,0,0,0,-1,0,1,0,1,0,0, ldraw_lib__1_16chrd()],
// 1 16 0 0 0 0.38268 0 -0.92388 0 1 0 0.92388 0 0.38268 1-16chrd.dat
  [1,16,0,0,0,0.38268,0,-0.92388,0,1,0,0.92388,0,0.38268, ldraw_lib__1_16chrd()],
// 1 16 0 0 0 0.70711 0 -0.70711 0 1 0 0.70711 0 0.70711 1-16chrd.dat
  [1,16,0,0,0,0.70711,0,-0.70711,0,1,0,0.70711,0,0.70711, ldraw_lib__1_16chrd()],
// 1 16 0 0 0 0.92388 0 -0.38268 0 1 0 0.38268 0 0.92388 1-16chrd.dat
  [1,16,0,0,0,0.92388,0,-0.38268,0,1,0,0.38268,0,0.92388, ldraw_lib__1_16chrd()],
// 1 16 0 0 0 -1 0 0 0 1 0 0 0 -1 1-16chrd.dat
  [1,16,0,0,0,-1,0,0,0,1,0,0,0,-1, ldraw_lib__1_16chrd()],
// 1 16 0 0 0 -0.92388 0 -0.38268 0 1 0 0.38268 0 -0.92388 1-16chrd.dat
  [1,16,0,0,0,-0.92388,0,-0.38268,0,1,0,0.38268,0,-0.92388, ldraw_lib__1_16chrd()],
// 1 16 0 0 0 -0.70711 0 -0.70711 0 1 0 0.70711 0 -0.70711 1-16chrd.dat
  [1,16,0,0,0,-0.70711,0,-0.70711,0,1,0,0.70711,0,-0.70711, ldraw_lib__1_16chrd()],
// 1 16 0 0 0 -0.38268 0 -0.92388 0 1 0 0.92388 0 -0.38268 1-16chrd.dat
  [1,16,0,0,0,-0.38268,0,-0.92388,0,1,0,0.92388,0,-0.38268, ldraw_lib__1_16chrd()],
];
module ldraw_lib__4_4ering(step=0, col=false, unit=2/5, alt=false, line=0.2, solid=!$preview)
    makepoly(ldraw_lib__4_4ering(), step=step, col=col, unit=unit, alt=alt, line=line, solid=solid);
ldraw_lib__4_4ering(line=0.2);
// file: ../p/4-4disc.scad
use <../lib.scad>
function ldraw_lib__4_4disc() = [
// 0 Disc 1.0
// 0 Name: 4-4disc.dat
// 0 Author: James Jessiman
// 0 !LDRAW_ORG Primitive UPDATE 2002-02
// 0 !LICENSE Licensed under CC BY 4.0 : see CAreadme.txt
// 
// 0 BFC CERTIFY CCW
  [0,"BFC","CERTIFY"],
  [0,"BFC","CCW"],
// 
// 0 !HISTORY 1998-12-15 [PTadmin] Official Update 1998-10
// 0 !HISTORY 2002-03-23 [sbliss] Added BFC statement
// 0 !HISTORY 2002-04-25 [PTadmin] Official Update 2002-02
// 0 !HISTORY 2007-06-24 [PTadmin] Header formatted for Contributor Agreement
// 0 !HISTORY 2008-07-01 [PTadmin] Official Update 2008-01
// 
// 
// 3 16 0 0 0 1 0 0 0.9239 0 0.3827
  [3,16,0,0,0,1,0,0,0.9239,0,0.3827],
// 3 16 0 0 0 0.9239 0 0.3827 0.7071 0 0.7071
  [3,16,0,0,0,0.9239,0,0.3827,0.7071,0,0.7071],
// 3 16 0 0 0 0.7071 0 0.7071 0.3827 0 0.9239
  [3,16,0,0,0,0.7071,0,0.7071,0.3827,0,0.9239],
// 3 16 0 0 0 0.3827 0 0.9239 0 0 1
  [3,16,0,0,0,0.3827,0,0.9239,0,0,1],
// 3 16 0 0 0 0 0 1 -0.3827 0 0.9239
  [3,16,0,0,0,0,0,1,-0.3827,0,0.9239],
// 3 16 0 0 0 -0.3827 0 0.9239 -0.7071 0 0.7071
  [3,16,0,0,0,-0.3827,0,0.9239,-0.7071,0,0.7071],
// 3 16 0 0 0 -0.7071 0 0.7071 -0.9239 0 0.3827
  [3,16,0,0,0,-0.7071,0,0.7071,-0.9239,0,0.3827],
// 3 16 0 0 0 -0.9239 0 0.3827 -1 0 -0
  [3,16,0,0,0,-0.9239,0,0.3827,-1,0,-0],
// 3 16 0 0 0 -1 0 -0 -0.9239 0 -0.3827
  [3,16,0,0,0,-1,0,-0,-0.9239,0,-0.3827],
// 3 16 0 0 0 -0.9239 0 -0.3827 -0.7071 0 -0.7071
  [3,16,0,0,0,-0.9239,0,-0.3827,-0.7071,0,-0.7071],
// 3 16 0 0 0 -0.7071 0 -0.7071 -0.3827 0 -0.9239
  [3,16,0,0,0,-0.7071,0,-0.7071,-0.3827,0,-0.9239],
// 3 16 0 0 0 -0.3827 0 -0.9239 0 0 -1
  [3,16,0,0,0,-0.3827,0,-0.9239,0,0,-1],
// 3 16 0 0 0 0 0 -1 0.3827 0 -0.9239
  [3,16,0,0,0,0,0,-1,0.3827,0,-0.9239],
// 3 16 0 0 0 0.3827 0 -0.9239 0.7071 0 -0.7071
  [3,16,0,0,0,0.3827,0,-0.9239,0.7071,0,-0.7071],
// 3 16 0 0 0 0.7071 0 -0.7071 0.9239 0 -0.3827
  [3,16,0,0,0,0.7071,0,-0.7071,0.9239,0,-0.3827],
// 3 16 0 0 0 0.9239 0 -0.3827 1 0 0
  [3,16,0,0,0,0.9239,0,-0.3827,1,0,0],
// 0
];
module ldraw_lib__4_4disc(step=0, col=false, unit=2/5, alt=false, line=0.2, solid=!$preview)
    makepoly(ldraw_lib__4_4disc(), step=step, col=col, unit=unit, alt=alt, line=line, solid=solid);
ldraw_lib__4_4disc(line=0.2);
// main file
use <../lib.scad>
use <../p/4-4disc.scad>
use <../p/4-4ering.scad>
use <../p/4-4ndis.scad>
use <s/98138s02.scad>
function ldraw_lib__98138p0y() = [
// 0 Tile  1 x  1 Round with Small White Offset Circle Pattern
// 0 Name: 98138p0y.dat
// 0 Author: Gerald Lasser [GeraldLasser]
// 0 !LDRAW_ORG Part UPDATE 2020-03
// 0 !LICENSE Licensed under CC BY 4.0 : see CAreadme.txt
// 
// 0 BFC CERTIFY CCW
  [0,"BFC","CERTIFY"],
  [0,"BFC","CCW"],
// 
// 0 !KEYWORDS BrickLink 98138pb097, Set 75228
// 
// 0 !HISTORY 2020-12-29 [PTadmin] Official Update 2020-03
// 
// 
// 1 16 0 0 0 1 0 0 0 1 0 0 0 1 s\98138s02.dat
  [1,16,0,0,0,1,0,0,0,1,0,0,0,1, ldraw_lib__s__98138s02()],
// 1 16 0 0 0 10 0 0 0 1 0 0 0 10 4-4ering.dat
  [1,16,0,0,0,10,0,0,0,1,0,0,0,10, ldraw_lib__4_4ering()],
// 1 15 0 0 -2.7 3 0 0 0 1 0 0 0 3 4-4disc.dat
  [1,15,0,0,-2.7,3,0,0,0,1,0,0,0,3, ldraw_lib__4_4disc()],
// 1 16 0 0 -2.7 3 0 0 0 1 0 0 0 3 4-4ndis.dat
  [1,16,0,0,-2.7,3,0,0,0,1,0,0,0,3, ldraw_lib__4_4ndis()],
// 4 16 0 0 -5.7 -3 0 -5.7 -3.827 0 -9.239 0 0 -10
  [4,16,0,0,-5.7,-3,0,-5.7,-3.827,0,-9.239,0,0,-10],
// 4 16 3 0 -5.7 0 0 -5.7 0 0 -10 3.827 0 -9.239
  [4,16,3,0,-5.7,0,0,-5.7,0,0,-10,3.827,0,-9.239],
// 4 16 3 0 -5.7 3.827 0 -9.239 7.071 0 -7.071 9.239 0 -3.827
  [4,16,3,0,-5.7,3.827,0,-9.239,7.071,0,-7.071,9.239,0,-3.827],
// 4 16 3 0 -2.7 3 0 -5.7 9.239 0 -3.827 10 0 0
  [4,16,3,0,-2.7,3,0,-5.7,9.239,0,-3.827,10,0,0],
// 4 16 3 0 .3 3 0 -2.7 10 0 0 9.239 0 3.827
  [4,16,3,0,.3,3,0,-2.7,10,0,0,9.239,0,3.827],
// 4 16 3 0 .3 9.239 0 3.827 7.071 0 7.071 0 0 .3
  [4,16,3,0,.3,9.239,0,3.827,7.071,0,7.071,0,0,.3],
// 4 16 0 0 .3 7.071 0 7.071 3.827 0 9.239 0 0 10
  [4,16,0,0,.3,7.071,0,7.071,3.827,0,9.239,0,0,10],
// 4 16 0 0 .3 0 0 10 -3.827 0 9.239 -7.071 0 7.071
  [4,16,0,0,.3,0,0,10,-3.827,0,9.239,-7.071,0,7.071],
// 4 16 -3 0 .3 0 0 .3 -7.071 0 7.071 -9.239 0 3.827
  [4,16,-3,0,.3,0,0,.3,-7.071,0,7.071,-9.239,0,3.827],
// 4 16 -3 0 .3 -9.239 0 3.827 -10 0 0 -9.239 0 -3.827
  [4,16,-3,0,.3,-9.239,0,3.827,-10,0,0,-9.239,0,-3.827],
// 4 16 -3 0 -2.7 -3 0 .3 -9.239 0 -3.827 -7.071 0 -7.071
  [4,16,-3,0,-2.7,-3,0,.3,-9.239,0,-3.827,-7.071,0,-7.071],
// 4 16 -3 0 -5.7 -3 0 -2.7 -7.071 0 -7.071 -3.827 0 -9.239
  [4,16,-3,0,-5.7,-3,0,-2.7,-7.071,0,-7.071,-3.827,0,-9.239],
];
module ldraw_lib__98138p0y(step=0, col=false, unit=2/5, alt=false, line=0.2, solid=!$preview)
    makepoly(ldraw_lib__98138p0y(), step=step, col=col, unit=unit, alt=alt, line=line, solid=solid);
ldraw_lib__98138p0y(line=0.2);
